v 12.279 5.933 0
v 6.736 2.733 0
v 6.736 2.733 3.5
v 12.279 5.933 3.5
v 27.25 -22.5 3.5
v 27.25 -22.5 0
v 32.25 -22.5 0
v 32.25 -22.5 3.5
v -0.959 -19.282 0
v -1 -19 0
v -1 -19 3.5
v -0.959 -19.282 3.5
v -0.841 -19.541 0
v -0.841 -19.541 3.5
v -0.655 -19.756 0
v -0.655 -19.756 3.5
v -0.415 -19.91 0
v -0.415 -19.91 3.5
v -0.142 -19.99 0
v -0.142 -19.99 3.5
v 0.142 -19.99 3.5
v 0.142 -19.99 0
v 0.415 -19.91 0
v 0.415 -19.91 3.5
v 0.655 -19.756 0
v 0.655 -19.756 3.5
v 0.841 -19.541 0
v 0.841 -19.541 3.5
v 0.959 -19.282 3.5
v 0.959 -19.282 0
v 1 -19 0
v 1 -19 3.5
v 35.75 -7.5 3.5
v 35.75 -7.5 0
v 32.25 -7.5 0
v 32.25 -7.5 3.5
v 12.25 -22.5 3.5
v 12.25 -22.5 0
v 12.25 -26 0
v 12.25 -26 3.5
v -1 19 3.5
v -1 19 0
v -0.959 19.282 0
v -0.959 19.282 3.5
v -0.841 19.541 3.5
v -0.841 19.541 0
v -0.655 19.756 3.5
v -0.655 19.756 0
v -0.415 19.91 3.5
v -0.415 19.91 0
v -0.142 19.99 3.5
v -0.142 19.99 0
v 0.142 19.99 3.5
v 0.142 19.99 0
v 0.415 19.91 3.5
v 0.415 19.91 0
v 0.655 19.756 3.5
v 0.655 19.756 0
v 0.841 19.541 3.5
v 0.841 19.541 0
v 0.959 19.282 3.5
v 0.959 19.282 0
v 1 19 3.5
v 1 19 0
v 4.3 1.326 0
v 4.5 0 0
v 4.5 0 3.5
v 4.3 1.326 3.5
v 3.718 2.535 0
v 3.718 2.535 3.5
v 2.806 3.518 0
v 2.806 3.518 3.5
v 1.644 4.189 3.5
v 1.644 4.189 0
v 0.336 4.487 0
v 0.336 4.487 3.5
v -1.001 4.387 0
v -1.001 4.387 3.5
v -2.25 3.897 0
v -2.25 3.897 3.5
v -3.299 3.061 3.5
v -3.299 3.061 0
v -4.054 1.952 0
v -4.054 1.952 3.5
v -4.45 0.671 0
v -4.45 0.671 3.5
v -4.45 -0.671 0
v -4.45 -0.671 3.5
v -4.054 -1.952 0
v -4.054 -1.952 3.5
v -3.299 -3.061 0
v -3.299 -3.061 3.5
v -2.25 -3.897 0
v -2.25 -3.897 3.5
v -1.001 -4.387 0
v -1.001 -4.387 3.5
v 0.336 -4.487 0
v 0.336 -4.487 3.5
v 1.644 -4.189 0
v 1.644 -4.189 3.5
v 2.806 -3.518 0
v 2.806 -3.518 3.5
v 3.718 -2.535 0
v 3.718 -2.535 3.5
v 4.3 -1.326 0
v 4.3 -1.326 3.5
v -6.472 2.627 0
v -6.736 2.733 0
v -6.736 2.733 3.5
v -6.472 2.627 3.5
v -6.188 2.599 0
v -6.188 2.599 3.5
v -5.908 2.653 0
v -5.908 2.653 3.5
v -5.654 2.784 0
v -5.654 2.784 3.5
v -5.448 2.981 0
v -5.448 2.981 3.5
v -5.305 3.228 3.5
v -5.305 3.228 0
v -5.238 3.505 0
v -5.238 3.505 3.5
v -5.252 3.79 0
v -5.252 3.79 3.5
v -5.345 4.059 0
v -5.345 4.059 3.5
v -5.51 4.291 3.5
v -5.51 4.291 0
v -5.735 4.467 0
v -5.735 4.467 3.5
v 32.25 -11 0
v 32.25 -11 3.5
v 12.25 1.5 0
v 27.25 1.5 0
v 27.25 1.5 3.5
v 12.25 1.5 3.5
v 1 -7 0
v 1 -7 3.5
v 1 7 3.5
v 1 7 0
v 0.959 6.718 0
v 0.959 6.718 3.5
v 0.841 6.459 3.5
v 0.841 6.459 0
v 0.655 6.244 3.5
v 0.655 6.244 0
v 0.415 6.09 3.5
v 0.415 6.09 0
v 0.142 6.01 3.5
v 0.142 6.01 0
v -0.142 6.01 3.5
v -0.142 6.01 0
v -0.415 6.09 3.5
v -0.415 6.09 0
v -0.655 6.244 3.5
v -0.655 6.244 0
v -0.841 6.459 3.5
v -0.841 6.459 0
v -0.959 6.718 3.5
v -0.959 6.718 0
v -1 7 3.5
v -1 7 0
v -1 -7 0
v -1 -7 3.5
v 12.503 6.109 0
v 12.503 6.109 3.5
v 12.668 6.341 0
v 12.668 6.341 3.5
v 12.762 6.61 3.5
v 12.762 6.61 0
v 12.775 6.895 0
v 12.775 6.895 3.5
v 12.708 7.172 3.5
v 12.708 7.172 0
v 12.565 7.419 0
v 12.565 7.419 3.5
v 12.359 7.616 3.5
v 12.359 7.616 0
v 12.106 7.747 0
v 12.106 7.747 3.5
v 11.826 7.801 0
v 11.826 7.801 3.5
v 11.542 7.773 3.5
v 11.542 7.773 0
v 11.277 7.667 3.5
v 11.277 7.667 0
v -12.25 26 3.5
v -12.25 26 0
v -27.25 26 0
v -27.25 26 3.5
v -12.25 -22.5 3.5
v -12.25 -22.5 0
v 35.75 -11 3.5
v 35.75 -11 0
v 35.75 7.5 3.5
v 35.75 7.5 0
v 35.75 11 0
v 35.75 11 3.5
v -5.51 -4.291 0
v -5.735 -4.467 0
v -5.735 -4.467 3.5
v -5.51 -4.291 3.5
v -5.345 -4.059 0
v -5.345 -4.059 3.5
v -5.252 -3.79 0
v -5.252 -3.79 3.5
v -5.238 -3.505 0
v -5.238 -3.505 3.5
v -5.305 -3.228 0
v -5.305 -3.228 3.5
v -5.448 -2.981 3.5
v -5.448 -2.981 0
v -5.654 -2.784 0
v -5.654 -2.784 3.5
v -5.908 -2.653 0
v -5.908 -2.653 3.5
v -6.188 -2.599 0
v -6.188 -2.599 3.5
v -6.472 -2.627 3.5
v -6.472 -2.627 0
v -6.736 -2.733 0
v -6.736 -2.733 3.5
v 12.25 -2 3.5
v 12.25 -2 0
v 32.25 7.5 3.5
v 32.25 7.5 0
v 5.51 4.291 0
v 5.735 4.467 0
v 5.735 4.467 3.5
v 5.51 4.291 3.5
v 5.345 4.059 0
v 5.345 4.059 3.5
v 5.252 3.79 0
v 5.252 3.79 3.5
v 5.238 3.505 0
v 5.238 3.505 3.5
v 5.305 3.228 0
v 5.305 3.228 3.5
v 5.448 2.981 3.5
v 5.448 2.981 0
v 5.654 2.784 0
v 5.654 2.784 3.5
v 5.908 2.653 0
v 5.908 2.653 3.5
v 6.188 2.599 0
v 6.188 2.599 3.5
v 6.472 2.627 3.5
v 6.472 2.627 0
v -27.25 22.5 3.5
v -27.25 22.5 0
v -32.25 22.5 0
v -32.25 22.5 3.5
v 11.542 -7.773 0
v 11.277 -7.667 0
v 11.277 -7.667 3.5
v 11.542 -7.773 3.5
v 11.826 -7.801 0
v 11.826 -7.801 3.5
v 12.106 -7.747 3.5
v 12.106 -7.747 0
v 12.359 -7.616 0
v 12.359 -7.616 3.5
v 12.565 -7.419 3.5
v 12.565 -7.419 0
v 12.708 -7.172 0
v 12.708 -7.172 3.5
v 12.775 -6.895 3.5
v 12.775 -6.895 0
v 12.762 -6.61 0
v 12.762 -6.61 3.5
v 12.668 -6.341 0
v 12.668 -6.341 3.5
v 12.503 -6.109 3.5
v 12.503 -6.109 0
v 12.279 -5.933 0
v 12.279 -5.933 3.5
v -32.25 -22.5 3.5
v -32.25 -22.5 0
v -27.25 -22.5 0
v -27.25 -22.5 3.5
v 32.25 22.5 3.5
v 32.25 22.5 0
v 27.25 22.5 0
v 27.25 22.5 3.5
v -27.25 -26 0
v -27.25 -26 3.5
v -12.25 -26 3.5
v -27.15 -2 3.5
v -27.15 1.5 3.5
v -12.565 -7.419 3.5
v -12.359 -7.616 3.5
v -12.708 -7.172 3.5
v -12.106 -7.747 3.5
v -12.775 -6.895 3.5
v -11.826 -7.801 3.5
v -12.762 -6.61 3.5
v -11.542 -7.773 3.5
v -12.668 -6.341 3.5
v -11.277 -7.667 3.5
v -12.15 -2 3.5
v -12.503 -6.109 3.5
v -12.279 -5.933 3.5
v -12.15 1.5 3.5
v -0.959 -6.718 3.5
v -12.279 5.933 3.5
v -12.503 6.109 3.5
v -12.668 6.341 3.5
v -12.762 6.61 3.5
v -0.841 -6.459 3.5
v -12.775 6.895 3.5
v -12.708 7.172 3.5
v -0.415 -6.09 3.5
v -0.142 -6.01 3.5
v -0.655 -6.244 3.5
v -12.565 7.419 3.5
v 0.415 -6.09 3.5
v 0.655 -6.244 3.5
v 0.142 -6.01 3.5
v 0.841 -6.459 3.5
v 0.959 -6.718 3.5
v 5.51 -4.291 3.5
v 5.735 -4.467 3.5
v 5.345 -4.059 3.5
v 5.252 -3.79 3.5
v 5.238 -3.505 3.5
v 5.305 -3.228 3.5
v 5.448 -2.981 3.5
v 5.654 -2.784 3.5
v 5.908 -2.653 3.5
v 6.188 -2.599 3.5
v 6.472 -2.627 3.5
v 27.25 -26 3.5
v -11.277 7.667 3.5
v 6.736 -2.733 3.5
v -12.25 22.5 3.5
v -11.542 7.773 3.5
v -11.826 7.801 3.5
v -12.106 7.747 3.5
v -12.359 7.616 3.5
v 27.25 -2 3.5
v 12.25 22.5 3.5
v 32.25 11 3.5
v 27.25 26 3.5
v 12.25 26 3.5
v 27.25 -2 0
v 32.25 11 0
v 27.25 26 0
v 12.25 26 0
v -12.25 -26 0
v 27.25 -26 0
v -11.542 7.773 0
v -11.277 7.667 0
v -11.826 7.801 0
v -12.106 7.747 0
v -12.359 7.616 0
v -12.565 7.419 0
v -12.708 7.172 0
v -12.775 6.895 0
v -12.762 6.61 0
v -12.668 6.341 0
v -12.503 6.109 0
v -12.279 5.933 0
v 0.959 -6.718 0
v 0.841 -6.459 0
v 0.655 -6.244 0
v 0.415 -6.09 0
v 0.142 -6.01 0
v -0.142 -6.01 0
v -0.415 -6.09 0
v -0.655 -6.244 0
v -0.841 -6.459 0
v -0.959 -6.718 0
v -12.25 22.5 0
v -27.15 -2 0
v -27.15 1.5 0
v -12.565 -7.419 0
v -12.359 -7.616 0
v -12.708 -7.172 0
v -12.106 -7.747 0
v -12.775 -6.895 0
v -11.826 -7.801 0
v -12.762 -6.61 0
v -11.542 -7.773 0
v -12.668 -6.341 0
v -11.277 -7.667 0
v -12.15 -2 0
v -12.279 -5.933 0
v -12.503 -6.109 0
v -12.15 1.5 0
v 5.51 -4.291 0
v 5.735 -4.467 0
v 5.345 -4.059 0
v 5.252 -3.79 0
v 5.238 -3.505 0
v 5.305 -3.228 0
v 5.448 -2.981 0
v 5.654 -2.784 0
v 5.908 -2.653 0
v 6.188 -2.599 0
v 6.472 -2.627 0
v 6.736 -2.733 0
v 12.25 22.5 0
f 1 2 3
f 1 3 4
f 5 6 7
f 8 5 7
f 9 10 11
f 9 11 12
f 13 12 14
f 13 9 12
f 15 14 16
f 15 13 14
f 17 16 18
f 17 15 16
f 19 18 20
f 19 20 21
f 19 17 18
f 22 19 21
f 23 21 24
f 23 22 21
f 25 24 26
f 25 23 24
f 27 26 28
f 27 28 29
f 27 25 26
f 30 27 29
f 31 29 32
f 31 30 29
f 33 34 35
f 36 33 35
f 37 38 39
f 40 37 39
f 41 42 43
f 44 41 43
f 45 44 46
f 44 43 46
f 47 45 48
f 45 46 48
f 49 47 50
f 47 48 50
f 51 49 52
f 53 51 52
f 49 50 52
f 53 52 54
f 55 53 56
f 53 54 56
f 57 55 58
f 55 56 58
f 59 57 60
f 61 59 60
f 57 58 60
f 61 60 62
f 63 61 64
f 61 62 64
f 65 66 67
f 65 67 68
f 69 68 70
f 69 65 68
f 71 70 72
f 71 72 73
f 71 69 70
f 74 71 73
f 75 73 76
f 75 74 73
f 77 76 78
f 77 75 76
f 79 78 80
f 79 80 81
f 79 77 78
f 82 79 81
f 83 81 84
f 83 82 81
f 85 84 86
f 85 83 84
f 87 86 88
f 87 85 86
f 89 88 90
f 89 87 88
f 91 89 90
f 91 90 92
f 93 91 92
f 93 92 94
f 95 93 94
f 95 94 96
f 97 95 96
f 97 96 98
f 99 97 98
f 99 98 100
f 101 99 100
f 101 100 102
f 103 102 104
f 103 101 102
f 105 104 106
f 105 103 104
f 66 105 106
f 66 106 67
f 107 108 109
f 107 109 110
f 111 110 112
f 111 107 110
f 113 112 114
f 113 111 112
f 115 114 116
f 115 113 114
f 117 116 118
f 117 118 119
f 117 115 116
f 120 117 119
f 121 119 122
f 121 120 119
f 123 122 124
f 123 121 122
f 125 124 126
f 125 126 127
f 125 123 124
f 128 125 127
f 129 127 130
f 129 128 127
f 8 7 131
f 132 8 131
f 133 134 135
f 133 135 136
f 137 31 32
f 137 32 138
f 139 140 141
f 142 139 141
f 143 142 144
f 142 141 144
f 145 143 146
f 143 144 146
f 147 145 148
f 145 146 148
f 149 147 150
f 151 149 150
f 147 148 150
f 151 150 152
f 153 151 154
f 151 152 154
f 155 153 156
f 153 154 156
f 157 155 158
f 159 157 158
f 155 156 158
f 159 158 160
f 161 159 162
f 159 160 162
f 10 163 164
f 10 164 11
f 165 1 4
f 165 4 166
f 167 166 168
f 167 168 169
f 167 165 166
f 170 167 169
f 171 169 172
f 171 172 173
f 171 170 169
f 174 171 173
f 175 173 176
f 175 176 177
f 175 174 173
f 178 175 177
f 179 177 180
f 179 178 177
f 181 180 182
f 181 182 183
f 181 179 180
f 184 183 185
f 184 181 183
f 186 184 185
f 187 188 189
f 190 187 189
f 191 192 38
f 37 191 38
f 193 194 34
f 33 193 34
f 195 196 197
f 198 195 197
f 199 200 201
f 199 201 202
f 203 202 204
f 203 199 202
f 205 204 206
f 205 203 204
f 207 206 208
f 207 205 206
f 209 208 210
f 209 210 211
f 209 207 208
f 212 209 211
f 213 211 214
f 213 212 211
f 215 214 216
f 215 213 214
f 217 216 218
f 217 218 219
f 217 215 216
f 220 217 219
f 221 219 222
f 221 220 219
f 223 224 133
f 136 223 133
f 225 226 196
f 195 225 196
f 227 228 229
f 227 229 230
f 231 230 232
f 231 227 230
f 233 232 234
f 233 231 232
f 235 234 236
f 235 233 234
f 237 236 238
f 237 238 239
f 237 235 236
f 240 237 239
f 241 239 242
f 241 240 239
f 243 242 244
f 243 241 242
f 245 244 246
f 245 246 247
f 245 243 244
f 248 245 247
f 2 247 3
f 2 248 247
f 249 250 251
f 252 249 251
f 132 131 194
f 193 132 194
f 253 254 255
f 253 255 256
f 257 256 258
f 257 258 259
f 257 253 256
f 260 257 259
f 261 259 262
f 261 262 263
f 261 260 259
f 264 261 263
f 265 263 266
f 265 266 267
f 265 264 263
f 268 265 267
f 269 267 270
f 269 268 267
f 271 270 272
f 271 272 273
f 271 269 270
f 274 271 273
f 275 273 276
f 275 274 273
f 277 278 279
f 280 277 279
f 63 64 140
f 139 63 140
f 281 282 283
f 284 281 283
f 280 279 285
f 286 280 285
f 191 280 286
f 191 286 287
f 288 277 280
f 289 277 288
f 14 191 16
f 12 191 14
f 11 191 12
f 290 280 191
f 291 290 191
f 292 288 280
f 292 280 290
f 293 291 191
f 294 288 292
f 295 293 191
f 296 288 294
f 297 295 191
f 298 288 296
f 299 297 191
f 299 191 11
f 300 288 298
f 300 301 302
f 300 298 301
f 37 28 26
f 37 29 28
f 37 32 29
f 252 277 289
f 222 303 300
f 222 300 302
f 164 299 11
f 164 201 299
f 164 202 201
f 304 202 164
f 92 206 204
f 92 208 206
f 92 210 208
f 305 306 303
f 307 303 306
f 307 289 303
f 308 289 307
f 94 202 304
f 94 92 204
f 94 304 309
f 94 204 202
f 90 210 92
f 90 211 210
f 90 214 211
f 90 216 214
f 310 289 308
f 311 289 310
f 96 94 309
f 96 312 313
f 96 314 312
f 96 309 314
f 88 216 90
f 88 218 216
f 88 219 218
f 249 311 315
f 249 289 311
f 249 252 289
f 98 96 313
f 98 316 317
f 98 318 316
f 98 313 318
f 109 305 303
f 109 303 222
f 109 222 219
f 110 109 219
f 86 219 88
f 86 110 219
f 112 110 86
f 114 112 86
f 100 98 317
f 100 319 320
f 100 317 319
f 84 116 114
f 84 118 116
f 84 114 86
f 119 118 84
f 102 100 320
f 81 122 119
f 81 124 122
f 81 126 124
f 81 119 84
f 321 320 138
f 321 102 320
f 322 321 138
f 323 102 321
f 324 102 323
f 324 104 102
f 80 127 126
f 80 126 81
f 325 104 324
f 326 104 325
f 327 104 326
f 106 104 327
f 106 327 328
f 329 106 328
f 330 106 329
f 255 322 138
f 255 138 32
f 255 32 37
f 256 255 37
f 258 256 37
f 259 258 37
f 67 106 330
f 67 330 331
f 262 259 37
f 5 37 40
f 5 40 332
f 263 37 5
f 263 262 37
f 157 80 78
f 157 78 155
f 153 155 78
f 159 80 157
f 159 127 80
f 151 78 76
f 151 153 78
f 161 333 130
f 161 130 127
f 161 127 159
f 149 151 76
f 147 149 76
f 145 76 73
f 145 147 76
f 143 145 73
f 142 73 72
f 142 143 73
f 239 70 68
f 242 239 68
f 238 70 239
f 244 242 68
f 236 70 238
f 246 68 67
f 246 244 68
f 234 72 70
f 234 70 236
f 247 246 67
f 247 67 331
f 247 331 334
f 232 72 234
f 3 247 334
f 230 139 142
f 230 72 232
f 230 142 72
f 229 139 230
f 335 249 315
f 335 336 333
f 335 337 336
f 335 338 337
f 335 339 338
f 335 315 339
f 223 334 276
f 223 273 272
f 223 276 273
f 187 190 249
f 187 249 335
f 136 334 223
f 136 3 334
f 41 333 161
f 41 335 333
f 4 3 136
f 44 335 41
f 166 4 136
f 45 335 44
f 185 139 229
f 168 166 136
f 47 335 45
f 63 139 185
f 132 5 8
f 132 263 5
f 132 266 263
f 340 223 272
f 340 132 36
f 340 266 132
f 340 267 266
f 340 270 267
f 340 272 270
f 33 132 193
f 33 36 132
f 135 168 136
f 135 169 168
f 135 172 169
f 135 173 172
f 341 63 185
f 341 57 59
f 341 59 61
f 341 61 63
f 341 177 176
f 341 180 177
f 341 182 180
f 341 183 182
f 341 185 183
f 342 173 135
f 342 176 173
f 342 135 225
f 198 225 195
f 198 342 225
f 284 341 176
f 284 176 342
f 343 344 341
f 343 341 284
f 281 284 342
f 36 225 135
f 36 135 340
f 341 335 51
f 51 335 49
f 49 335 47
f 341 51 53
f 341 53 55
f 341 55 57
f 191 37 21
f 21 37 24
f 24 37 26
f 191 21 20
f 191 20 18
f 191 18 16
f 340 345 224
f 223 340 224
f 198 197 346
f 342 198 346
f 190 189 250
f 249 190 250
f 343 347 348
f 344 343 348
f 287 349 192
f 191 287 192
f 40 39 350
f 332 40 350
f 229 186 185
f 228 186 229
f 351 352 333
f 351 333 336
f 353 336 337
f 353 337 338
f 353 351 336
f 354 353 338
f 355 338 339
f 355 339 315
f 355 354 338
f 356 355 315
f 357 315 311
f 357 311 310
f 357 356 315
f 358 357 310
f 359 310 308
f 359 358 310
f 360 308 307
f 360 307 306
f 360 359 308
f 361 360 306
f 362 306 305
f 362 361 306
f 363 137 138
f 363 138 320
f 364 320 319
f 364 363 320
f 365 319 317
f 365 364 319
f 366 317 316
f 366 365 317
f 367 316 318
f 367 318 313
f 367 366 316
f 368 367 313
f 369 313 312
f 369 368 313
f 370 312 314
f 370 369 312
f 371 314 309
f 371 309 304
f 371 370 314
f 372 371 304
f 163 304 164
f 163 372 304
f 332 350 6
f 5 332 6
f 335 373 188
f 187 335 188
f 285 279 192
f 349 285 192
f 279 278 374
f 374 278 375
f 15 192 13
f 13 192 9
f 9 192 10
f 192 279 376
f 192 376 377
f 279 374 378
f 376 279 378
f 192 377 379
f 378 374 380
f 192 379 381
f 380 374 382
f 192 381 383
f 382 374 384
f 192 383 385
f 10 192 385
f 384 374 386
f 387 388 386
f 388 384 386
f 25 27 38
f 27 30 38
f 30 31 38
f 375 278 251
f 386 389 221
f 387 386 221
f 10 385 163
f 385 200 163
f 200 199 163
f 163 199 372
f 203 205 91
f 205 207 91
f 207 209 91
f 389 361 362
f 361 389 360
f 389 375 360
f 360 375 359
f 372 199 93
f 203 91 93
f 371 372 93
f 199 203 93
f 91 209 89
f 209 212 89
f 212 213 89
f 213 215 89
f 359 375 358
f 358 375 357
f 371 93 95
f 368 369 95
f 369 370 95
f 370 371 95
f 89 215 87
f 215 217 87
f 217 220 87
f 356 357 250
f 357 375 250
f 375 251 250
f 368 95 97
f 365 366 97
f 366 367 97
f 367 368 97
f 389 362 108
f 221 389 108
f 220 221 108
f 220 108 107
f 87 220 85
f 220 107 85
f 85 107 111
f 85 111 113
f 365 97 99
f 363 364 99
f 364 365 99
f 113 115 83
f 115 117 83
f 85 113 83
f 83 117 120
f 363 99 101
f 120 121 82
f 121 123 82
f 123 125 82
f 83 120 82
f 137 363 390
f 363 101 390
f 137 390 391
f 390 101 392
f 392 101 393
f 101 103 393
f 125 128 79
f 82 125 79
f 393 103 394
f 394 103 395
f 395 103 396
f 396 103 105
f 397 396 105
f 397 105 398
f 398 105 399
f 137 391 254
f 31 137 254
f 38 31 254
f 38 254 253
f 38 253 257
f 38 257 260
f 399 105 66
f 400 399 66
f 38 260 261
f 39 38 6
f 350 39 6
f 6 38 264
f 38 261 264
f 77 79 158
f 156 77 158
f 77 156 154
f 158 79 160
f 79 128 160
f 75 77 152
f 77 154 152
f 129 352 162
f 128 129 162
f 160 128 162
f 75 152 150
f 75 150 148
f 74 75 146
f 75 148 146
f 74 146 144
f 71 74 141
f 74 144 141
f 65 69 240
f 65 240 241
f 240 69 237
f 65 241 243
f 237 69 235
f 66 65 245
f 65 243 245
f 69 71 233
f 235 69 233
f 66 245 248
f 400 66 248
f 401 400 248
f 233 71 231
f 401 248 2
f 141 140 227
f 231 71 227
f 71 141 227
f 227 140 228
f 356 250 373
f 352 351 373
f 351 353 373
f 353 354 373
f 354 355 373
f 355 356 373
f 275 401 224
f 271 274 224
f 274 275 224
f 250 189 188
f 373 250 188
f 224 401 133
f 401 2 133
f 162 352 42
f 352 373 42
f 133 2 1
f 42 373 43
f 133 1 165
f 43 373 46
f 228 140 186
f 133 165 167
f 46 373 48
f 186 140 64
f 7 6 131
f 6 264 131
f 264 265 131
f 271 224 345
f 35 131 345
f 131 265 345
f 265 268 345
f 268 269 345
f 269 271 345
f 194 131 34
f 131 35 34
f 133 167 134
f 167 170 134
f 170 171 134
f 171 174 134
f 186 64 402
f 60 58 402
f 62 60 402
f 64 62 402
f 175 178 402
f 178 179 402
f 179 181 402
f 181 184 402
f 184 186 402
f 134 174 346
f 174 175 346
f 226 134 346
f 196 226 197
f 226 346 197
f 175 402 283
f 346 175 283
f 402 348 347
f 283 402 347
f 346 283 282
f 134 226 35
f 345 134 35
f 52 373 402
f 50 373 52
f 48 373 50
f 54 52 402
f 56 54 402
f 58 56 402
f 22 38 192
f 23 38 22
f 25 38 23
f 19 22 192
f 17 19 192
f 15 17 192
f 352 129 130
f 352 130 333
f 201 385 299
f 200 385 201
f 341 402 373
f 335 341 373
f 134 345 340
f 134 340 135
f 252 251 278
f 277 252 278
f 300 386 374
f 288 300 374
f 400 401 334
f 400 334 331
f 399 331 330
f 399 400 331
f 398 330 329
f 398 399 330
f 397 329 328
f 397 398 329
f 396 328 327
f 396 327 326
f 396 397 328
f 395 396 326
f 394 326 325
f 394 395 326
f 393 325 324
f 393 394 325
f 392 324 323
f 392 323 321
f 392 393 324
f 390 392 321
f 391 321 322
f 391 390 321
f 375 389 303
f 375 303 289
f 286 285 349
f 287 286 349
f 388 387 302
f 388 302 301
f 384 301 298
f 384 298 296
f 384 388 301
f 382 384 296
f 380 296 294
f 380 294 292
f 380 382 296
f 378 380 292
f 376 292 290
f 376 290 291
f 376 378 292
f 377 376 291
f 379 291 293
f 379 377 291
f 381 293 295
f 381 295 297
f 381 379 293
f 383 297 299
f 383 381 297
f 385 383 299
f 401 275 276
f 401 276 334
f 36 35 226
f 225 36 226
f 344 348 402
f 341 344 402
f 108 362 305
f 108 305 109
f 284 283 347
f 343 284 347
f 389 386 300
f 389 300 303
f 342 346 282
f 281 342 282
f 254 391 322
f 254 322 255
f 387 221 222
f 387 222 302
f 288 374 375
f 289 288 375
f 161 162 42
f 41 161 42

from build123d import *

# Parameters (mm, degrees)
SKETCH1_R           = 4.5
BOSS_EXTRUDE1_DEPTH = 3.5
SKETCH2_W           = 15
SKETCH2_H           = 3.5
CUT_EXTRUDE1_DEPTH  = 45.343122353


with BuildPart() as part:
    # Sketch1 → Boss-Extrude1 (new body)
    with BuildSketch(Plane.XY):
        Polygon((27.25, -26), (27.25, -22.5), (32.25, -22.5), (32.25, -11), (35.75, -11), (35.75, -7.5), (32.25, -7.5), (32.25, 7.5), (35.75, 7.5), (35.75, 11), (32.25, 11), (32.25, 22.5), (27.25, 22.5), (27.25, 26), (12.25, 26), (12.25, 22.5), (-12.25, 22.5), (-12.25, 26), (-27.25, 26), (-27.25, 22.5), (-32.25, 22.5), (-32.25, -22.5), (-27.25, -22.5), (-27.25, -26), (-12.25, -26), (-12.25, -22.5), (12.25, -22.5), (12.25, -26), align=None)
        Circle(SKETCH1_R, mode=Mode.SUBTRACT)
        with BuildLine():
            Line((-11.277098909, -7.667491727), (-5.734536325, -4.467491727))
            ThreePointArc((-5.734536325, -4.467491727), (-5.36789118, -3.099153418), (-6.736229489, -2.732508273))
            Line((-6.736229489, -2.732508273), (-12.278792074, -5.932508273))
            ThreePointArc((-12.278792074, -5.932508273), (-12.645437219, -7.300846582), (-11.277098909, -7.667491727))
        make_face(mode=Mode.SUBTRACT)
        with BuildLine():
            Line((1, 19), (1, 7))
            ThreePointArc((1, 7), (0, 6), (-1, 7))
            Line((-1, 7), (-1, 19))
            ThreePointArc((-1, 19), (0, 20), (1, 19))
        make_face(mode=Mode.SUBTRACT)
        with BuildLine():
            Line((-12.278792074, 5.932508273), (-6.736229489, 2.732508273))
            ThreePointArc((-6.736229489, 2.732508273), (-5.36789118, 3.099153418), (-5.734536325, 4.467491727))
            Line((-5.734536325, 4.467491727), (-11.277098909, 7.667491727))
            ThreePointArc((-11.277098909, 7.667491727), (-12.645437219, 7.300846582), (-12.278792074, 5.932508273))
        make_face(mode=Mode.SUBTRACT)
        with BuildLine():
            Line((11.277098909, 7.667491727), (5.734536325, 4.467491727))
            ThreePointArc((5.734536325, 4.467491727), (5.36789118, 3.099153418), (6.736229489, 2.732508273))
            Line((6.736229489, 2.732508273), (12.278792074, 5.932508273))
            ThreePointArc((12.278792074, 5.932508273), (12.645437219, 7.300846582), (11.277098909, 7.667491727))
        make_face(mode=Mode.SUBTRACT)
        with BuildLine():
            Line((12.278792074, -5.932508273), (6.736229489, -2.732508273))
            ThreePointArc((6.736229489, -2.732508273), (5.36789118, -3.099153418), (5.734536325, -4.467491727))
            Line((5.734536325, -4.467491727), (11.277098909, -7.667491727))
            ThreePointArc((11.277098909, -7.667491727), (12.645437219, -7.300846582), (12.278792074, -5.932508273))
        make_face(mode=Mode.SUBTRACT)
        with BuildLine():
            Line((1, -19), (1, -7))
            ThreePointArc((1, -7), (0, -6), (-1, -7))
            Line((-1, -7), (-1, -19))
            ThreePointArc((-1, -19), (0, -20), (1, -19))
        make_face(mode=Mode.SUBTRACT)
    extrude(amount=BOSS_EXTRUDE1_DEPTH)

    # Sketch2 → Cut-Extrude1 (cut, through all)
    with BuildSketch(Plane(origin=(0, 0, 0), x_dir=(-1, 0, 0), z_dir=(0, 0, -1))):
        with Locations((19.65, -0.25)):
            Rectangle(SKETCH2_W, SKETCH2_H)
        with Locations((-19.75, -0.25)):
            Rectangle(SKETCH2_W, SKETCH2_H)
    extrude(amount=-CUT_EXTRUDE1_DEPTH, mode=Mode.SUBTRACT)


solid = part.part
